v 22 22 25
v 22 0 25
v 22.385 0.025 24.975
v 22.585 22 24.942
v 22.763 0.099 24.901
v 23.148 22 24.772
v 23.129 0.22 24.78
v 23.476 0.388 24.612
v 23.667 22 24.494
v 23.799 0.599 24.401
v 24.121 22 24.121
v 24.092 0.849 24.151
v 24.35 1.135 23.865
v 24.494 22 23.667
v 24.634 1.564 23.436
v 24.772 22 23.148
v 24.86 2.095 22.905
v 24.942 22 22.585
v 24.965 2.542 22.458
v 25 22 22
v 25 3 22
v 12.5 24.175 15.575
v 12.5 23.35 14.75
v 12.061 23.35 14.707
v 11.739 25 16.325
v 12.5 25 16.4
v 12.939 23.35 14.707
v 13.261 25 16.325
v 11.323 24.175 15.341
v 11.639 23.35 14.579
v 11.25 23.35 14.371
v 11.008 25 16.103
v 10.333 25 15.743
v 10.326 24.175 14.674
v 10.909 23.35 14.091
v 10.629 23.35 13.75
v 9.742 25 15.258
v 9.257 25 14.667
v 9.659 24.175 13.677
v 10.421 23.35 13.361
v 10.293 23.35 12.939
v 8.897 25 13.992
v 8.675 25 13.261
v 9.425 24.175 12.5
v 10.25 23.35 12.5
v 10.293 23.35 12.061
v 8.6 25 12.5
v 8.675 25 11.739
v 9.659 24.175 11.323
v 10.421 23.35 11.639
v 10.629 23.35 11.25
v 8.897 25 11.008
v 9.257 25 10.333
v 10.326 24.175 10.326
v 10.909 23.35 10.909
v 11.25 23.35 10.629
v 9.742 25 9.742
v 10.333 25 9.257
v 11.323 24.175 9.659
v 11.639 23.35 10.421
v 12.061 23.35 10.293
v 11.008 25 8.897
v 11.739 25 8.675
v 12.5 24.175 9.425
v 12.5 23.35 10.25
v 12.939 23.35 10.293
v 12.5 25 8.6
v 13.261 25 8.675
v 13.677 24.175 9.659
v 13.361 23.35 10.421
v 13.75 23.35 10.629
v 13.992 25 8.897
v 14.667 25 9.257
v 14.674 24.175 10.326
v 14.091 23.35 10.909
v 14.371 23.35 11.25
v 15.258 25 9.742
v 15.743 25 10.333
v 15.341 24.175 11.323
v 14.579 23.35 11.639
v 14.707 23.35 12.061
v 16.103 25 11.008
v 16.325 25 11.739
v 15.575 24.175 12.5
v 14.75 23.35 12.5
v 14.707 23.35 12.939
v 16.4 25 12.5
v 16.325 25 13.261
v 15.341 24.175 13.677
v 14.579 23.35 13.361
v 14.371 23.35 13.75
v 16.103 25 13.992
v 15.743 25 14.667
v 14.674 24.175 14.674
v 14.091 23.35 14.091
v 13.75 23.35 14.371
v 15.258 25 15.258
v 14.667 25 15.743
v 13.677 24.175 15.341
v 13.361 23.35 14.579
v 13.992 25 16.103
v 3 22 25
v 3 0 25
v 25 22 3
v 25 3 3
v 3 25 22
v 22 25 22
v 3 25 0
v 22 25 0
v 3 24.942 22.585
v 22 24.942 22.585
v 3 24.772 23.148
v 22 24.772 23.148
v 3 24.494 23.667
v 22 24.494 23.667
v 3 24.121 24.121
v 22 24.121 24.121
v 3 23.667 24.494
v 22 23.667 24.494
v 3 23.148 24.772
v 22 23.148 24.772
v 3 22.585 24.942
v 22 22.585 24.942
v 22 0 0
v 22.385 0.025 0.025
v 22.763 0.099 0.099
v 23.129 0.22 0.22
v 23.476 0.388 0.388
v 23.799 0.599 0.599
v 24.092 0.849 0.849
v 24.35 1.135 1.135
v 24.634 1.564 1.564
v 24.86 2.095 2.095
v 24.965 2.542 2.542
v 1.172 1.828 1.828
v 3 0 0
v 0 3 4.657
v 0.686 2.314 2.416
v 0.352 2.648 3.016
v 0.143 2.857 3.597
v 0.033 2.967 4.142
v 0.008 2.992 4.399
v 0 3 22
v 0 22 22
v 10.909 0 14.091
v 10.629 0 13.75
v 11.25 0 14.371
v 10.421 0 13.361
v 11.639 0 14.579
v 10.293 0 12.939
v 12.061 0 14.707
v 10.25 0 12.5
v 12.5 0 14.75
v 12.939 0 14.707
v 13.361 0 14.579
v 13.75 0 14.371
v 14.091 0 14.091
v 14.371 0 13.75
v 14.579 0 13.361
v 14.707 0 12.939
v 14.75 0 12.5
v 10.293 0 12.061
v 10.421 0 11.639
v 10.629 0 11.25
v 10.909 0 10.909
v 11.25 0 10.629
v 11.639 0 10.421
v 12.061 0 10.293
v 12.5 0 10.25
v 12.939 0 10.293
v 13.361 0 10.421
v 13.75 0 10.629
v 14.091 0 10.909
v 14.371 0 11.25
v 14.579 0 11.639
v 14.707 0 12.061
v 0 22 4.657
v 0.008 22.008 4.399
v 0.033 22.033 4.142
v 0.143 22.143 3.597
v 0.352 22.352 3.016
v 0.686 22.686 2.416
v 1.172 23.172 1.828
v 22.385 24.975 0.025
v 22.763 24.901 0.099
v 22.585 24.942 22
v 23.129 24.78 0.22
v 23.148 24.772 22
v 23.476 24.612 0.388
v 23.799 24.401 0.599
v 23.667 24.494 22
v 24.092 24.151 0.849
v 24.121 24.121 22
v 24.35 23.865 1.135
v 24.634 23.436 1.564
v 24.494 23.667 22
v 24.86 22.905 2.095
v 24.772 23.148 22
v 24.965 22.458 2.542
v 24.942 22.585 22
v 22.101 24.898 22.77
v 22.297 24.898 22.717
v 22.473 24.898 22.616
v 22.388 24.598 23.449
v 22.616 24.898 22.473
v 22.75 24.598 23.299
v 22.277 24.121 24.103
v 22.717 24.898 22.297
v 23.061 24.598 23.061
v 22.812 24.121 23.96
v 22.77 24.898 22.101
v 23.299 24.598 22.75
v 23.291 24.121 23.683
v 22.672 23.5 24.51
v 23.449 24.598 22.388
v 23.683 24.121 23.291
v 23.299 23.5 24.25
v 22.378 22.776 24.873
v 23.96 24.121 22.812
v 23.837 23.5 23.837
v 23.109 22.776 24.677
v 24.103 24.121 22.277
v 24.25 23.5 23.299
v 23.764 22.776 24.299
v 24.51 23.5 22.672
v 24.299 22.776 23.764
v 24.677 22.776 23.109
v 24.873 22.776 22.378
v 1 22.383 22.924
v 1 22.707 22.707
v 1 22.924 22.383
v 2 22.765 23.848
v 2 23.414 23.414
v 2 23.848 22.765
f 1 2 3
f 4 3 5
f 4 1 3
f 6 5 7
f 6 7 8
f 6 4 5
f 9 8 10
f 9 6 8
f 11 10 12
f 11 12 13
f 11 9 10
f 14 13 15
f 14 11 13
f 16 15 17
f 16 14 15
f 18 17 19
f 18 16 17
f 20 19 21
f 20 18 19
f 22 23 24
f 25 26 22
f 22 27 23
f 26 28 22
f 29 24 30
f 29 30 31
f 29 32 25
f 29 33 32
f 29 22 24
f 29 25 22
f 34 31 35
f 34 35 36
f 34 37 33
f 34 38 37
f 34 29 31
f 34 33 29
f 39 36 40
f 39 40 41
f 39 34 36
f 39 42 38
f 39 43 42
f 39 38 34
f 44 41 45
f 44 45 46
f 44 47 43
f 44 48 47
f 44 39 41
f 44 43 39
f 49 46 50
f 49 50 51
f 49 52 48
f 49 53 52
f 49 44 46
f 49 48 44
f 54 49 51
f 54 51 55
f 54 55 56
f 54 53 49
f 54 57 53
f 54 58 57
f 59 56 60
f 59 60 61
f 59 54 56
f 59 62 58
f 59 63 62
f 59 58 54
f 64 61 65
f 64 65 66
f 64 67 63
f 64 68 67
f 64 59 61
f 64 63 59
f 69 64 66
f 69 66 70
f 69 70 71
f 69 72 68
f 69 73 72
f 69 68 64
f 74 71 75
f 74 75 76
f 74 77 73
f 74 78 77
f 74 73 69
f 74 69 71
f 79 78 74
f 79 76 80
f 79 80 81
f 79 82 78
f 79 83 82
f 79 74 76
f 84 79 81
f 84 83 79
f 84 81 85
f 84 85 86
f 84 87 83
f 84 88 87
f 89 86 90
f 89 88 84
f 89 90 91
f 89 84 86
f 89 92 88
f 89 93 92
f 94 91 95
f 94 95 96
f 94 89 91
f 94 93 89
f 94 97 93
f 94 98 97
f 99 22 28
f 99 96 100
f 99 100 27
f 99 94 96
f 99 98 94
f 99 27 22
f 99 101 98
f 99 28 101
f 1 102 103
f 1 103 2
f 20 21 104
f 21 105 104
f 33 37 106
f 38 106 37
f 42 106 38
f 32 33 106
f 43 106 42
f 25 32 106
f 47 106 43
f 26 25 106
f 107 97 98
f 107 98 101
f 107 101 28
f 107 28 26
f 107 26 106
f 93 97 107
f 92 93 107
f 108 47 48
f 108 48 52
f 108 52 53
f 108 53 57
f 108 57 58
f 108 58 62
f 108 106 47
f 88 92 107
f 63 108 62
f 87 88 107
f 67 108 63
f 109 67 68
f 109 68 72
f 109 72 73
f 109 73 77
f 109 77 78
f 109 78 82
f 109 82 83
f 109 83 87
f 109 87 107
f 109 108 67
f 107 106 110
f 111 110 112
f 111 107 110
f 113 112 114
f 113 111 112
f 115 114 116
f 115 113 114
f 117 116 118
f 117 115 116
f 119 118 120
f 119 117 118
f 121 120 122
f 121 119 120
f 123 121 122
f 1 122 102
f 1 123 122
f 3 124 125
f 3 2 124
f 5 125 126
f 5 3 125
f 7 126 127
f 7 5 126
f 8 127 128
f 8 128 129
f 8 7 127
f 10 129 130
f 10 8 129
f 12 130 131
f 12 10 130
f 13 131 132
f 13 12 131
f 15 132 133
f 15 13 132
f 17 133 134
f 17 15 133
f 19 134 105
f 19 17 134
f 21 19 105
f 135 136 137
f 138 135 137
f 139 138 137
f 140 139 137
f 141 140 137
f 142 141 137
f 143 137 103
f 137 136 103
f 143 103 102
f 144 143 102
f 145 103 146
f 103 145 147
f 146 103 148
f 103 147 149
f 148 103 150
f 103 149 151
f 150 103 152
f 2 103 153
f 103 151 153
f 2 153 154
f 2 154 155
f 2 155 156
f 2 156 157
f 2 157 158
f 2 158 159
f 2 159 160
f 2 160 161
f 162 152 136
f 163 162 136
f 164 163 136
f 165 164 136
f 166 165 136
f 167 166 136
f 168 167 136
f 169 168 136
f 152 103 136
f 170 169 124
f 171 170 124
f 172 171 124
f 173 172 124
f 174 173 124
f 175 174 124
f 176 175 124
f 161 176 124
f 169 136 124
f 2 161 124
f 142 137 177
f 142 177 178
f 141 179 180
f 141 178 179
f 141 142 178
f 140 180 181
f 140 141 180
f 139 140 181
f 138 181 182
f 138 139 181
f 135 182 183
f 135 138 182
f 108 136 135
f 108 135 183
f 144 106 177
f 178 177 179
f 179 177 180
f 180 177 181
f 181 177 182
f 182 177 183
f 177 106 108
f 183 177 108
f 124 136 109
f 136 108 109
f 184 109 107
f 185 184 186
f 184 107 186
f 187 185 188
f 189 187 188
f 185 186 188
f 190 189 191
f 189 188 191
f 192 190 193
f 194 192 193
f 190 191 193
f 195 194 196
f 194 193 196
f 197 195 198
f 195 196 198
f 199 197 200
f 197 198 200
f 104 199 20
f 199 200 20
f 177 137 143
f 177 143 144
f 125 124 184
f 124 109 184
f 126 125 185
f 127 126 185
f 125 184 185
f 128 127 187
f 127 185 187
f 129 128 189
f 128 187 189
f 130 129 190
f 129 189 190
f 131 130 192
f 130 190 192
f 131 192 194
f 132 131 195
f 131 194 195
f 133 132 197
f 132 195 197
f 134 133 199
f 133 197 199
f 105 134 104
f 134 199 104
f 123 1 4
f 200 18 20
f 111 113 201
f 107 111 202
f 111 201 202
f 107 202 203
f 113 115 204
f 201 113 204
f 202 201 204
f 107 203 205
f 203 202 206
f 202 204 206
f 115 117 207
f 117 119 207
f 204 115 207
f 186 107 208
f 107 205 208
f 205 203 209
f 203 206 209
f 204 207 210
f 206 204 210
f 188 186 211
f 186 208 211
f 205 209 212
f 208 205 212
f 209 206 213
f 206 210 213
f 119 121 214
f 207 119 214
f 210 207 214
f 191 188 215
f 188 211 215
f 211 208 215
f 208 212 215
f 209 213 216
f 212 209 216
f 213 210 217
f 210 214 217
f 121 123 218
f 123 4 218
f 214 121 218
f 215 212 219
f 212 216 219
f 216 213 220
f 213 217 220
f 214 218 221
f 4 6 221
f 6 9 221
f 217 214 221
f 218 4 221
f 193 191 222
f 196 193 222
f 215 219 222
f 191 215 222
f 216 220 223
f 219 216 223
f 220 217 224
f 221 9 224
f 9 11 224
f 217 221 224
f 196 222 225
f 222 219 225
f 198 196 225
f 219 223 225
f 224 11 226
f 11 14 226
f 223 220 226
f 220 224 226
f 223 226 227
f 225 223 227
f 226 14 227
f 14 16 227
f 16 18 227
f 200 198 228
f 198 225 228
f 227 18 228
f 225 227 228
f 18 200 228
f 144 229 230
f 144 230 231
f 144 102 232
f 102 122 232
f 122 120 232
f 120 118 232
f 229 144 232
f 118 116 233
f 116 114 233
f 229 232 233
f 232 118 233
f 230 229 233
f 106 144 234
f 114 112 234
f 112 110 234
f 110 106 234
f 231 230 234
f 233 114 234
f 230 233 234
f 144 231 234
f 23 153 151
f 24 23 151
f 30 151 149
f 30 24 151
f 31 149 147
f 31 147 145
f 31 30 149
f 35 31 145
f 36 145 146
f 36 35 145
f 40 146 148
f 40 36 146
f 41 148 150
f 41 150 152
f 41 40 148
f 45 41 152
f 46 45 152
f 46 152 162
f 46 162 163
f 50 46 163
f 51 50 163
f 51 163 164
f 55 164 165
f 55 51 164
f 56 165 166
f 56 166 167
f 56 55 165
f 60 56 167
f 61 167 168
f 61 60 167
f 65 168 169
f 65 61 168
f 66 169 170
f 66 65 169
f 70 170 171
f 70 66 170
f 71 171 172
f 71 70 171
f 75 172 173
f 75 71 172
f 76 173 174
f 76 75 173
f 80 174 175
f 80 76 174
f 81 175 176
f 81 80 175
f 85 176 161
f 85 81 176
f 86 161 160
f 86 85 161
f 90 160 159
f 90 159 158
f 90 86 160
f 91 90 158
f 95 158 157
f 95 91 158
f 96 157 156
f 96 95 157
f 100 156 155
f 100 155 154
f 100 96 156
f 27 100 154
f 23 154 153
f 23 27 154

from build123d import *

# Parameters (mm, degrees)
SKETCH_1_W       = 25
SKETCH_1_H       = 25
EXTRUDE_1_DEPTH  = 25
FILLET_1_R       = 3
CHAMFER_1_SIZE   = 3
FILLET_1_2_DEPTH = 25


with BuildPart() as part:
    # 草图1 → 凸台-拉伸1 (new body)
    with BuildSketch(Plane.XY):
        with Locations((12.5, 12.5)):
            Rectangle(SKETCH_1_W, SKETCH_1_H)
    extrude(amount=EXTRUDE_1_DEPTH)

    # 草图2 → 切除-旋转1 (revolve, cut)
    with BuildSketch(Plane.XY.offset(12.5), mode=Mode.PRIVATE) as cut_revolve_1_sk:
        Polygon((10.25, 0), (10.25, 23.35), (8.6, 25), (12.5, 25), (12.5, 0), align=None)
    revolve(cut_revolve_1_sk.sketch.rotate(Axis((12.5, 25, 12.5), (0, -1, 0)), 270), axis=Axis((12.5, 25, 12.5), (0, -1, 0)), mode=Mode.SUBTRACT)

    # Fillet 1
    fillet_1_edges = [part.edges().sort_by_distance(p)[0] for p in [
        (25, 12.5, 25),
        (12.5, 25, 25),
        (25, 12.5, 0),
        (25, 25, 12.5),
        (25, 0, 12.5),
    ]]
    fillet(fillet_1_edges, radius=FILLET_1_R)

    # 倒角1
    chamfer_1_edges = [part.edges().sort_by_distance(p)[0] for p in [
        (0, 11, 25),
        (0, 25, 11),
        (0, 24.121320344, 24.121320344),
        (0, 12.5, 0),
        (0, 0, 12.5),
    ]]
    chamfer(chamfer_1_edges, length=CHAMFER_1_SIZE)

    # Fillet 1 2: read off the stored shape, not the designer's step
    # Fillet 1 2 outline → Fillet 1 2 (cut)
    with BuildSketch(Plane(origin=(0, 0, 0), x_dir=(1, 0, 0), z_dir=(0, 1, 0))):
        with BuildLine():
            ThreePointArc((0, -4.656854249), (0.30448187, -3.12612052), (1.171572875, -1.828427125))
            Line((1.171572875, -1.828427125), (0, -3))
            Line((0, -3), (0, -4.656854249))
        make_face()
    extrude(amount=FILLET_1_2_DEPTH, mode=Mode.SUBTRACT)


solid = part.part
